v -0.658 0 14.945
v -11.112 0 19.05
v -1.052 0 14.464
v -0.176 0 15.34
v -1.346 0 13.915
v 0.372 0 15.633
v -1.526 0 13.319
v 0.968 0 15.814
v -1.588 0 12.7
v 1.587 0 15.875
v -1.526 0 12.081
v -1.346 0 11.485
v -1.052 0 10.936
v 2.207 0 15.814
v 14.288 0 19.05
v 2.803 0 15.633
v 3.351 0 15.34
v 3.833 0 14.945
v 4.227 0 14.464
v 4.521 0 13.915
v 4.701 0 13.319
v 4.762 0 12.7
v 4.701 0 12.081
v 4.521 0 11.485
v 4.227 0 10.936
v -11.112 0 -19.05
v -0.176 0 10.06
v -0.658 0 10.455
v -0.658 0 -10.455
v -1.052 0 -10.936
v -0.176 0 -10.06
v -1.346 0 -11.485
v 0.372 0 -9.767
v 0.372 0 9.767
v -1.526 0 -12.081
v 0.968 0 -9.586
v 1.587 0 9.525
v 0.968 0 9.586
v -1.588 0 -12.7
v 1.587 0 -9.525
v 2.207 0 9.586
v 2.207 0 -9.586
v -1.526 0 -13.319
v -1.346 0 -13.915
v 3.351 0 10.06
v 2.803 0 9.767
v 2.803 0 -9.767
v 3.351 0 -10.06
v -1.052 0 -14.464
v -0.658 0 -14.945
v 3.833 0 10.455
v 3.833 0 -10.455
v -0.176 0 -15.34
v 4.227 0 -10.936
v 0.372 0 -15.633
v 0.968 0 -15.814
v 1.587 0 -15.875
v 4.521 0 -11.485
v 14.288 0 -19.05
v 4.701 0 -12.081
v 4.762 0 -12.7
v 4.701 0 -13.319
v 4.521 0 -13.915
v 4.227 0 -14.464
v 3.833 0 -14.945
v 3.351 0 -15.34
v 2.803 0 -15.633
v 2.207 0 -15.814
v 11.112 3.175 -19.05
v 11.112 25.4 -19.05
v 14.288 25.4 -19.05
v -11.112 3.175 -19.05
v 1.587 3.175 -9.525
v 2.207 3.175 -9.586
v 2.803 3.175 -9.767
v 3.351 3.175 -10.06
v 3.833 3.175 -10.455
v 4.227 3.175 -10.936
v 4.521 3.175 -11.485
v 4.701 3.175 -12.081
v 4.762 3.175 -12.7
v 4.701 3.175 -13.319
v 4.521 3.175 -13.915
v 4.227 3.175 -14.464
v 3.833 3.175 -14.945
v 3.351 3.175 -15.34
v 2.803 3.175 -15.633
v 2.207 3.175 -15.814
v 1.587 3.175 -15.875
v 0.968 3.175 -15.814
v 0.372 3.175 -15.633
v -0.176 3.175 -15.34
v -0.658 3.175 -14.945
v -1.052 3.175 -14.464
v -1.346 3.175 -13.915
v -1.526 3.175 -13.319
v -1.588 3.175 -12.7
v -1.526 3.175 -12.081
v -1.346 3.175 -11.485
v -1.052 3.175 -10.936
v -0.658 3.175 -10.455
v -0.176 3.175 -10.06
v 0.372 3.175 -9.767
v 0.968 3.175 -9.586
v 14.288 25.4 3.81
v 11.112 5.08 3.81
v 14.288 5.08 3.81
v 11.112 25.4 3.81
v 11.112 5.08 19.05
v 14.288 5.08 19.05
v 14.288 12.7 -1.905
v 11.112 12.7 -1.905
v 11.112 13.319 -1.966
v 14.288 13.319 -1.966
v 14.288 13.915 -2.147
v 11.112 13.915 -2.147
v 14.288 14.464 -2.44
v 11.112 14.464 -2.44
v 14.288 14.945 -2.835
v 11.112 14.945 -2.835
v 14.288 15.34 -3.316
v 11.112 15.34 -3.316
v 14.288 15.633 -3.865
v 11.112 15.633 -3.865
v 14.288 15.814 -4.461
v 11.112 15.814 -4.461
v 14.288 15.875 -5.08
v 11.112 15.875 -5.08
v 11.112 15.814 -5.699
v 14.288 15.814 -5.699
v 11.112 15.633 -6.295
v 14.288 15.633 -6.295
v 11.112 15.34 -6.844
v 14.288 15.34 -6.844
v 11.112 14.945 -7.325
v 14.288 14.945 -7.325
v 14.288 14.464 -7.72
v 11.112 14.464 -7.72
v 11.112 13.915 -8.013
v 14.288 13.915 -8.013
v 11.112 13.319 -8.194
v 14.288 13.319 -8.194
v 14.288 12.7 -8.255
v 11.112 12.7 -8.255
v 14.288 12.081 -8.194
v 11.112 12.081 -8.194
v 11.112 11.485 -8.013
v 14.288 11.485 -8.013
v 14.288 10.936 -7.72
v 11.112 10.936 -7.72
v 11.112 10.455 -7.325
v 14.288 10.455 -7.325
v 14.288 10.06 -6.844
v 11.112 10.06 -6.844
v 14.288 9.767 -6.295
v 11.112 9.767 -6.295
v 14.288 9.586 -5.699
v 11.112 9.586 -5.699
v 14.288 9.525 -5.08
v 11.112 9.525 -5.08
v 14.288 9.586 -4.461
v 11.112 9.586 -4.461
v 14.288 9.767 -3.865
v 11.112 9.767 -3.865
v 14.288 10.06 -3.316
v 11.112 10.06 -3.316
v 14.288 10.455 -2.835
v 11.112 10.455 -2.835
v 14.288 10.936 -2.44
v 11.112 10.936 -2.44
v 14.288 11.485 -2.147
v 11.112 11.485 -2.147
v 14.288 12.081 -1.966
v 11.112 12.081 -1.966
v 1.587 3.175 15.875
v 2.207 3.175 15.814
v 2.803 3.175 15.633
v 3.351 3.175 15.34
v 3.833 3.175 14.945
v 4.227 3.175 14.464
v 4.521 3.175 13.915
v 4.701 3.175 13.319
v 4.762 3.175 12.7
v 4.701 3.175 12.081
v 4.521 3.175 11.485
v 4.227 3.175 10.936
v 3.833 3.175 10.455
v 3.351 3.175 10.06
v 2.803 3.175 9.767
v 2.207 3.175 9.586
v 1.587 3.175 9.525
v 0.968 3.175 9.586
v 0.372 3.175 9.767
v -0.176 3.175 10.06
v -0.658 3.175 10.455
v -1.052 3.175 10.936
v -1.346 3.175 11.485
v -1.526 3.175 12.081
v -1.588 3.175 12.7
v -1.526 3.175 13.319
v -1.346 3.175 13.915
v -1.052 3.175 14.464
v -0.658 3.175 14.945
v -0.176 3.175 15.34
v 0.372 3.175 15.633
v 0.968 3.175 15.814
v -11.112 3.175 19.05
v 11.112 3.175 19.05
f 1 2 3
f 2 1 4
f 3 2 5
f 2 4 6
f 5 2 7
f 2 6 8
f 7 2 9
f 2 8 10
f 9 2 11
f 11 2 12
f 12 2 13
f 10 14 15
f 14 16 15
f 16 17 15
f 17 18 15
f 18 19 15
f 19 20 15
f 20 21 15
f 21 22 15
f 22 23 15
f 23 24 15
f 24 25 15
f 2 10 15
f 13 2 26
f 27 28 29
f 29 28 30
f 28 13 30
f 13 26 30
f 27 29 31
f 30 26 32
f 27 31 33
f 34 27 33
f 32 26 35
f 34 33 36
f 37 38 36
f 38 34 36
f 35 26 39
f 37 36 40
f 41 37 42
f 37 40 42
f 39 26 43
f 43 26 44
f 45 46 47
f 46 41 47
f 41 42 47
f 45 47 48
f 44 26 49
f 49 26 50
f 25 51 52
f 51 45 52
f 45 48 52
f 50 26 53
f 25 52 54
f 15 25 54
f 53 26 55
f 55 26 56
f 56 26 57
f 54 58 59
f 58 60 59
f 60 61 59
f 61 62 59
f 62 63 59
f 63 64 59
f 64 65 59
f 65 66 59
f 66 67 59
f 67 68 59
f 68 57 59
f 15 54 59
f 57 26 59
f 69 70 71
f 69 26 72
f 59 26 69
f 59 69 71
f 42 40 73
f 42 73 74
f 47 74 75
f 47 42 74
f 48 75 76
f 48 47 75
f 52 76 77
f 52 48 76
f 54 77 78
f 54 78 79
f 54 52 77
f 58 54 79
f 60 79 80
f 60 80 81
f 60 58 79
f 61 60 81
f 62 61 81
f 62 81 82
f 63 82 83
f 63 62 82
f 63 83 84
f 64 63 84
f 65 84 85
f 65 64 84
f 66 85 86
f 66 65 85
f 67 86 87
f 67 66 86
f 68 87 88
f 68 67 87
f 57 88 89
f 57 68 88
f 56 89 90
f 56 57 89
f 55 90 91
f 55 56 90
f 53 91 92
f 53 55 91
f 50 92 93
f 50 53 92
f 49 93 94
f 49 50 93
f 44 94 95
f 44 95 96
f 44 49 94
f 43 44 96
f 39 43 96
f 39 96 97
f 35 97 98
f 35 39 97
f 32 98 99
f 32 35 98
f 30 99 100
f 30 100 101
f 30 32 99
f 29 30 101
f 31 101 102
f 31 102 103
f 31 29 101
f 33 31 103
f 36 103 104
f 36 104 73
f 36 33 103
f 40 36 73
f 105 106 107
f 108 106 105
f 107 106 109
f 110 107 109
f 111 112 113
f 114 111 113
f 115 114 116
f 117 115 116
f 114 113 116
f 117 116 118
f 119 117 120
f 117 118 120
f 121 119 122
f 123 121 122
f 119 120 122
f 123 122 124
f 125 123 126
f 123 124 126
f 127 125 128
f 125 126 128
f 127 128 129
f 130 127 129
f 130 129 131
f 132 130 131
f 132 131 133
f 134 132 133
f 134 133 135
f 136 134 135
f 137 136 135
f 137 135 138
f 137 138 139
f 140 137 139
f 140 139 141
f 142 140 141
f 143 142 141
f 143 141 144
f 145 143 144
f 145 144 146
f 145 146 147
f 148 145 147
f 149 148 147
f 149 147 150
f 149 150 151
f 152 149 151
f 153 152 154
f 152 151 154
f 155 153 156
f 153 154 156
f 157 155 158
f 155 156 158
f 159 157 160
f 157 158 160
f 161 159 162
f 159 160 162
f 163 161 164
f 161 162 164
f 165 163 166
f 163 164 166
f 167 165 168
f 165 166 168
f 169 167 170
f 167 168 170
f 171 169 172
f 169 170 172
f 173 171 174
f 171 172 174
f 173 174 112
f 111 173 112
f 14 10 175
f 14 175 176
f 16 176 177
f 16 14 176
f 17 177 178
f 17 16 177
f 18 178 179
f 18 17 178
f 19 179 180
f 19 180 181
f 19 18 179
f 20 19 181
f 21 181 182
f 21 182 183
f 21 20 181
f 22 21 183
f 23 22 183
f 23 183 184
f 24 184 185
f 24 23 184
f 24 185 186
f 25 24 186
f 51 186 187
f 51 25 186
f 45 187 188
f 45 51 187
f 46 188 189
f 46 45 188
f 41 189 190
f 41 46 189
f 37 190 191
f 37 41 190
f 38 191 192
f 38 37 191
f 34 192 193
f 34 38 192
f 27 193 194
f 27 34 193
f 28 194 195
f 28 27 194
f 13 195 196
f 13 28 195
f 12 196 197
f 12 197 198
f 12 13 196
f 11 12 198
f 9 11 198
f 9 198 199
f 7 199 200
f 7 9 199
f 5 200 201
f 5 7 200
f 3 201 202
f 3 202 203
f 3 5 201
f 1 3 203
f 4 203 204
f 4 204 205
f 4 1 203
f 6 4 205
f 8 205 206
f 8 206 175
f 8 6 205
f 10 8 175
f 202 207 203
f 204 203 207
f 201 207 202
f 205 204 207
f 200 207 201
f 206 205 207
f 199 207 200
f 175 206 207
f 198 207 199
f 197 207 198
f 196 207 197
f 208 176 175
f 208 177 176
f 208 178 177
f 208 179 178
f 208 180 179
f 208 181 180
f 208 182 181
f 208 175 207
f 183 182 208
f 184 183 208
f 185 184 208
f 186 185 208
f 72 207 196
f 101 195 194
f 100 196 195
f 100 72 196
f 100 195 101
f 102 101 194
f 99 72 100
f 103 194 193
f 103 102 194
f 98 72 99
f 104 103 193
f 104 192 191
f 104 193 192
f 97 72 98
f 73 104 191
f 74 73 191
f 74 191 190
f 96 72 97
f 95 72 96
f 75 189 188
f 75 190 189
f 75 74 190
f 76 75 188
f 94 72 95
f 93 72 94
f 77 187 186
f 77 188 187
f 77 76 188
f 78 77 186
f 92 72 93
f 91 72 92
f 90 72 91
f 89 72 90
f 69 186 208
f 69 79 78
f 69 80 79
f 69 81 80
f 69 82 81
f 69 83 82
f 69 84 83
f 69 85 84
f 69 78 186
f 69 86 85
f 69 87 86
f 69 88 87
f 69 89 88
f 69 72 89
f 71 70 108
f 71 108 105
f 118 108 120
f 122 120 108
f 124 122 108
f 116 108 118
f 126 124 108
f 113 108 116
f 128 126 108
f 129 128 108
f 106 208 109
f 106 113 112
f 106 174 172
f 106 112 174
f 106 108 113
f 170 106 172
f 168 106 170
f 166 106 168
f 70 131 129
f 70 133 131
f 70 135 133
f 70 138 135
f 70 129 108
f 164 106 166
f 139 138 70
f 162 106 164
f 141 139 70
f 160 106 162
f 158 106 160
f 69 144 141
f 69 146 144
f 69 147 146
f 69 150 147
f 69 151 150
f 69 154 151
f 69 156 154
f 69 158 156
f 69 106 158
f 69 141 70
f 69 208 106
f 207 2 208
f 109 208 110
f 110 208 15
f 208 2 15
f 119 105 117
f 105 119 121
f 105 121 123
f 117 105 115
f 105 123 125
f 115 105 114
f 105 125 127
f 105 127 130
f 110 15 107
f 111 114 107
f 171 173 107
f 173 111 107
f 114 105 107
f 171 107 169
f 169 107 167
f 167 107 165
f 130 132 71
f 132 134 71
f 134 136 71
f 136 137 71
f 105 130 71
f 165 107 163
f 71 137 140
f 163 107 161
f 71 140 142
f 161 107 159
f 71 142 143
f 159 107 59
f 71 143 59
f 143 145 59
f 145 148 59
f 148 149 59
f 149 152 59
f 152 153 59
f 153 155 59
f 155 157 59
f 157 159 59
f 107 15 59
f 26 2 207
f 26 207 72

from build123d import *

# Parameters (mm, degrees)
SKETCH1_W           = 22.225
SKETCH1_H           = 38.1
SKETCH1_R           = 3.175
BOSS_EXTRUDE1_DEPTH = 3.175
SKETCH2_W           = 3.175
SKETCH2_H           = 38.1
BOSS_EXTRUDE2_DEPTH = 25.4
SKETCH3_R           = 3.175
SKETCH3_W           = 15.24
SKETCH3_H           = 20.32
CUT_EXTRUDE1_DEPTH  = 39.75581408


with BuildPart() as part:
    # Sketch1 → Boss-Extrude1 (new body)
    with BuildSketch(Plane(origin=(0, 0, 0), x_dir=(1, 0, 0), z_dir=(0, 1, 0))):
        Rectangle(SKETCH1_W, SKETCH1_H)
        with Locations(Location((1.5875, 12.7, 0), (0, 0, 270))):
            Circle(SKETCH1_R, mode=Mode.SUBTRACT)
        with Locations(Location((1.5875, -12.7, 0), (0, 0, 270))):
            Circle(SKETCH1_R, mode=Mode.SUBTRACT)
    extrude(amount=BOSS_EXTRUDE1_DEPTH)

    # Sketch2 → Boss-Extrude2 (add)
    with BuildSketch(Plane(origin=(0, 0, 0), x_dir=(1, 0, 0), z_dir=(0, 1, 0))):
        with Locations((12.7, 0)):
            Rectangle(SKETCH2_W, SKETCH2_H)
    extrude(amount=BOSS_EXTRUDE2_DEPTH)

    # Sketch3 → Cut-Extrude1 (cut, through all)
    with BuildSketch(Plane.ZY.offset(-11.1125)):
        with Locations((-5.08, 12.7)):
            Circle(SKETCH3_R)
        with Locations((11.43, 15.24)):
            Rectangle(SKETCH3_W, SKETCH3_H)
    extrude(amount=-CUT_EXTRUDE1_DEPTH, mode=Mode.SUBTRACT)


solid = part.part
